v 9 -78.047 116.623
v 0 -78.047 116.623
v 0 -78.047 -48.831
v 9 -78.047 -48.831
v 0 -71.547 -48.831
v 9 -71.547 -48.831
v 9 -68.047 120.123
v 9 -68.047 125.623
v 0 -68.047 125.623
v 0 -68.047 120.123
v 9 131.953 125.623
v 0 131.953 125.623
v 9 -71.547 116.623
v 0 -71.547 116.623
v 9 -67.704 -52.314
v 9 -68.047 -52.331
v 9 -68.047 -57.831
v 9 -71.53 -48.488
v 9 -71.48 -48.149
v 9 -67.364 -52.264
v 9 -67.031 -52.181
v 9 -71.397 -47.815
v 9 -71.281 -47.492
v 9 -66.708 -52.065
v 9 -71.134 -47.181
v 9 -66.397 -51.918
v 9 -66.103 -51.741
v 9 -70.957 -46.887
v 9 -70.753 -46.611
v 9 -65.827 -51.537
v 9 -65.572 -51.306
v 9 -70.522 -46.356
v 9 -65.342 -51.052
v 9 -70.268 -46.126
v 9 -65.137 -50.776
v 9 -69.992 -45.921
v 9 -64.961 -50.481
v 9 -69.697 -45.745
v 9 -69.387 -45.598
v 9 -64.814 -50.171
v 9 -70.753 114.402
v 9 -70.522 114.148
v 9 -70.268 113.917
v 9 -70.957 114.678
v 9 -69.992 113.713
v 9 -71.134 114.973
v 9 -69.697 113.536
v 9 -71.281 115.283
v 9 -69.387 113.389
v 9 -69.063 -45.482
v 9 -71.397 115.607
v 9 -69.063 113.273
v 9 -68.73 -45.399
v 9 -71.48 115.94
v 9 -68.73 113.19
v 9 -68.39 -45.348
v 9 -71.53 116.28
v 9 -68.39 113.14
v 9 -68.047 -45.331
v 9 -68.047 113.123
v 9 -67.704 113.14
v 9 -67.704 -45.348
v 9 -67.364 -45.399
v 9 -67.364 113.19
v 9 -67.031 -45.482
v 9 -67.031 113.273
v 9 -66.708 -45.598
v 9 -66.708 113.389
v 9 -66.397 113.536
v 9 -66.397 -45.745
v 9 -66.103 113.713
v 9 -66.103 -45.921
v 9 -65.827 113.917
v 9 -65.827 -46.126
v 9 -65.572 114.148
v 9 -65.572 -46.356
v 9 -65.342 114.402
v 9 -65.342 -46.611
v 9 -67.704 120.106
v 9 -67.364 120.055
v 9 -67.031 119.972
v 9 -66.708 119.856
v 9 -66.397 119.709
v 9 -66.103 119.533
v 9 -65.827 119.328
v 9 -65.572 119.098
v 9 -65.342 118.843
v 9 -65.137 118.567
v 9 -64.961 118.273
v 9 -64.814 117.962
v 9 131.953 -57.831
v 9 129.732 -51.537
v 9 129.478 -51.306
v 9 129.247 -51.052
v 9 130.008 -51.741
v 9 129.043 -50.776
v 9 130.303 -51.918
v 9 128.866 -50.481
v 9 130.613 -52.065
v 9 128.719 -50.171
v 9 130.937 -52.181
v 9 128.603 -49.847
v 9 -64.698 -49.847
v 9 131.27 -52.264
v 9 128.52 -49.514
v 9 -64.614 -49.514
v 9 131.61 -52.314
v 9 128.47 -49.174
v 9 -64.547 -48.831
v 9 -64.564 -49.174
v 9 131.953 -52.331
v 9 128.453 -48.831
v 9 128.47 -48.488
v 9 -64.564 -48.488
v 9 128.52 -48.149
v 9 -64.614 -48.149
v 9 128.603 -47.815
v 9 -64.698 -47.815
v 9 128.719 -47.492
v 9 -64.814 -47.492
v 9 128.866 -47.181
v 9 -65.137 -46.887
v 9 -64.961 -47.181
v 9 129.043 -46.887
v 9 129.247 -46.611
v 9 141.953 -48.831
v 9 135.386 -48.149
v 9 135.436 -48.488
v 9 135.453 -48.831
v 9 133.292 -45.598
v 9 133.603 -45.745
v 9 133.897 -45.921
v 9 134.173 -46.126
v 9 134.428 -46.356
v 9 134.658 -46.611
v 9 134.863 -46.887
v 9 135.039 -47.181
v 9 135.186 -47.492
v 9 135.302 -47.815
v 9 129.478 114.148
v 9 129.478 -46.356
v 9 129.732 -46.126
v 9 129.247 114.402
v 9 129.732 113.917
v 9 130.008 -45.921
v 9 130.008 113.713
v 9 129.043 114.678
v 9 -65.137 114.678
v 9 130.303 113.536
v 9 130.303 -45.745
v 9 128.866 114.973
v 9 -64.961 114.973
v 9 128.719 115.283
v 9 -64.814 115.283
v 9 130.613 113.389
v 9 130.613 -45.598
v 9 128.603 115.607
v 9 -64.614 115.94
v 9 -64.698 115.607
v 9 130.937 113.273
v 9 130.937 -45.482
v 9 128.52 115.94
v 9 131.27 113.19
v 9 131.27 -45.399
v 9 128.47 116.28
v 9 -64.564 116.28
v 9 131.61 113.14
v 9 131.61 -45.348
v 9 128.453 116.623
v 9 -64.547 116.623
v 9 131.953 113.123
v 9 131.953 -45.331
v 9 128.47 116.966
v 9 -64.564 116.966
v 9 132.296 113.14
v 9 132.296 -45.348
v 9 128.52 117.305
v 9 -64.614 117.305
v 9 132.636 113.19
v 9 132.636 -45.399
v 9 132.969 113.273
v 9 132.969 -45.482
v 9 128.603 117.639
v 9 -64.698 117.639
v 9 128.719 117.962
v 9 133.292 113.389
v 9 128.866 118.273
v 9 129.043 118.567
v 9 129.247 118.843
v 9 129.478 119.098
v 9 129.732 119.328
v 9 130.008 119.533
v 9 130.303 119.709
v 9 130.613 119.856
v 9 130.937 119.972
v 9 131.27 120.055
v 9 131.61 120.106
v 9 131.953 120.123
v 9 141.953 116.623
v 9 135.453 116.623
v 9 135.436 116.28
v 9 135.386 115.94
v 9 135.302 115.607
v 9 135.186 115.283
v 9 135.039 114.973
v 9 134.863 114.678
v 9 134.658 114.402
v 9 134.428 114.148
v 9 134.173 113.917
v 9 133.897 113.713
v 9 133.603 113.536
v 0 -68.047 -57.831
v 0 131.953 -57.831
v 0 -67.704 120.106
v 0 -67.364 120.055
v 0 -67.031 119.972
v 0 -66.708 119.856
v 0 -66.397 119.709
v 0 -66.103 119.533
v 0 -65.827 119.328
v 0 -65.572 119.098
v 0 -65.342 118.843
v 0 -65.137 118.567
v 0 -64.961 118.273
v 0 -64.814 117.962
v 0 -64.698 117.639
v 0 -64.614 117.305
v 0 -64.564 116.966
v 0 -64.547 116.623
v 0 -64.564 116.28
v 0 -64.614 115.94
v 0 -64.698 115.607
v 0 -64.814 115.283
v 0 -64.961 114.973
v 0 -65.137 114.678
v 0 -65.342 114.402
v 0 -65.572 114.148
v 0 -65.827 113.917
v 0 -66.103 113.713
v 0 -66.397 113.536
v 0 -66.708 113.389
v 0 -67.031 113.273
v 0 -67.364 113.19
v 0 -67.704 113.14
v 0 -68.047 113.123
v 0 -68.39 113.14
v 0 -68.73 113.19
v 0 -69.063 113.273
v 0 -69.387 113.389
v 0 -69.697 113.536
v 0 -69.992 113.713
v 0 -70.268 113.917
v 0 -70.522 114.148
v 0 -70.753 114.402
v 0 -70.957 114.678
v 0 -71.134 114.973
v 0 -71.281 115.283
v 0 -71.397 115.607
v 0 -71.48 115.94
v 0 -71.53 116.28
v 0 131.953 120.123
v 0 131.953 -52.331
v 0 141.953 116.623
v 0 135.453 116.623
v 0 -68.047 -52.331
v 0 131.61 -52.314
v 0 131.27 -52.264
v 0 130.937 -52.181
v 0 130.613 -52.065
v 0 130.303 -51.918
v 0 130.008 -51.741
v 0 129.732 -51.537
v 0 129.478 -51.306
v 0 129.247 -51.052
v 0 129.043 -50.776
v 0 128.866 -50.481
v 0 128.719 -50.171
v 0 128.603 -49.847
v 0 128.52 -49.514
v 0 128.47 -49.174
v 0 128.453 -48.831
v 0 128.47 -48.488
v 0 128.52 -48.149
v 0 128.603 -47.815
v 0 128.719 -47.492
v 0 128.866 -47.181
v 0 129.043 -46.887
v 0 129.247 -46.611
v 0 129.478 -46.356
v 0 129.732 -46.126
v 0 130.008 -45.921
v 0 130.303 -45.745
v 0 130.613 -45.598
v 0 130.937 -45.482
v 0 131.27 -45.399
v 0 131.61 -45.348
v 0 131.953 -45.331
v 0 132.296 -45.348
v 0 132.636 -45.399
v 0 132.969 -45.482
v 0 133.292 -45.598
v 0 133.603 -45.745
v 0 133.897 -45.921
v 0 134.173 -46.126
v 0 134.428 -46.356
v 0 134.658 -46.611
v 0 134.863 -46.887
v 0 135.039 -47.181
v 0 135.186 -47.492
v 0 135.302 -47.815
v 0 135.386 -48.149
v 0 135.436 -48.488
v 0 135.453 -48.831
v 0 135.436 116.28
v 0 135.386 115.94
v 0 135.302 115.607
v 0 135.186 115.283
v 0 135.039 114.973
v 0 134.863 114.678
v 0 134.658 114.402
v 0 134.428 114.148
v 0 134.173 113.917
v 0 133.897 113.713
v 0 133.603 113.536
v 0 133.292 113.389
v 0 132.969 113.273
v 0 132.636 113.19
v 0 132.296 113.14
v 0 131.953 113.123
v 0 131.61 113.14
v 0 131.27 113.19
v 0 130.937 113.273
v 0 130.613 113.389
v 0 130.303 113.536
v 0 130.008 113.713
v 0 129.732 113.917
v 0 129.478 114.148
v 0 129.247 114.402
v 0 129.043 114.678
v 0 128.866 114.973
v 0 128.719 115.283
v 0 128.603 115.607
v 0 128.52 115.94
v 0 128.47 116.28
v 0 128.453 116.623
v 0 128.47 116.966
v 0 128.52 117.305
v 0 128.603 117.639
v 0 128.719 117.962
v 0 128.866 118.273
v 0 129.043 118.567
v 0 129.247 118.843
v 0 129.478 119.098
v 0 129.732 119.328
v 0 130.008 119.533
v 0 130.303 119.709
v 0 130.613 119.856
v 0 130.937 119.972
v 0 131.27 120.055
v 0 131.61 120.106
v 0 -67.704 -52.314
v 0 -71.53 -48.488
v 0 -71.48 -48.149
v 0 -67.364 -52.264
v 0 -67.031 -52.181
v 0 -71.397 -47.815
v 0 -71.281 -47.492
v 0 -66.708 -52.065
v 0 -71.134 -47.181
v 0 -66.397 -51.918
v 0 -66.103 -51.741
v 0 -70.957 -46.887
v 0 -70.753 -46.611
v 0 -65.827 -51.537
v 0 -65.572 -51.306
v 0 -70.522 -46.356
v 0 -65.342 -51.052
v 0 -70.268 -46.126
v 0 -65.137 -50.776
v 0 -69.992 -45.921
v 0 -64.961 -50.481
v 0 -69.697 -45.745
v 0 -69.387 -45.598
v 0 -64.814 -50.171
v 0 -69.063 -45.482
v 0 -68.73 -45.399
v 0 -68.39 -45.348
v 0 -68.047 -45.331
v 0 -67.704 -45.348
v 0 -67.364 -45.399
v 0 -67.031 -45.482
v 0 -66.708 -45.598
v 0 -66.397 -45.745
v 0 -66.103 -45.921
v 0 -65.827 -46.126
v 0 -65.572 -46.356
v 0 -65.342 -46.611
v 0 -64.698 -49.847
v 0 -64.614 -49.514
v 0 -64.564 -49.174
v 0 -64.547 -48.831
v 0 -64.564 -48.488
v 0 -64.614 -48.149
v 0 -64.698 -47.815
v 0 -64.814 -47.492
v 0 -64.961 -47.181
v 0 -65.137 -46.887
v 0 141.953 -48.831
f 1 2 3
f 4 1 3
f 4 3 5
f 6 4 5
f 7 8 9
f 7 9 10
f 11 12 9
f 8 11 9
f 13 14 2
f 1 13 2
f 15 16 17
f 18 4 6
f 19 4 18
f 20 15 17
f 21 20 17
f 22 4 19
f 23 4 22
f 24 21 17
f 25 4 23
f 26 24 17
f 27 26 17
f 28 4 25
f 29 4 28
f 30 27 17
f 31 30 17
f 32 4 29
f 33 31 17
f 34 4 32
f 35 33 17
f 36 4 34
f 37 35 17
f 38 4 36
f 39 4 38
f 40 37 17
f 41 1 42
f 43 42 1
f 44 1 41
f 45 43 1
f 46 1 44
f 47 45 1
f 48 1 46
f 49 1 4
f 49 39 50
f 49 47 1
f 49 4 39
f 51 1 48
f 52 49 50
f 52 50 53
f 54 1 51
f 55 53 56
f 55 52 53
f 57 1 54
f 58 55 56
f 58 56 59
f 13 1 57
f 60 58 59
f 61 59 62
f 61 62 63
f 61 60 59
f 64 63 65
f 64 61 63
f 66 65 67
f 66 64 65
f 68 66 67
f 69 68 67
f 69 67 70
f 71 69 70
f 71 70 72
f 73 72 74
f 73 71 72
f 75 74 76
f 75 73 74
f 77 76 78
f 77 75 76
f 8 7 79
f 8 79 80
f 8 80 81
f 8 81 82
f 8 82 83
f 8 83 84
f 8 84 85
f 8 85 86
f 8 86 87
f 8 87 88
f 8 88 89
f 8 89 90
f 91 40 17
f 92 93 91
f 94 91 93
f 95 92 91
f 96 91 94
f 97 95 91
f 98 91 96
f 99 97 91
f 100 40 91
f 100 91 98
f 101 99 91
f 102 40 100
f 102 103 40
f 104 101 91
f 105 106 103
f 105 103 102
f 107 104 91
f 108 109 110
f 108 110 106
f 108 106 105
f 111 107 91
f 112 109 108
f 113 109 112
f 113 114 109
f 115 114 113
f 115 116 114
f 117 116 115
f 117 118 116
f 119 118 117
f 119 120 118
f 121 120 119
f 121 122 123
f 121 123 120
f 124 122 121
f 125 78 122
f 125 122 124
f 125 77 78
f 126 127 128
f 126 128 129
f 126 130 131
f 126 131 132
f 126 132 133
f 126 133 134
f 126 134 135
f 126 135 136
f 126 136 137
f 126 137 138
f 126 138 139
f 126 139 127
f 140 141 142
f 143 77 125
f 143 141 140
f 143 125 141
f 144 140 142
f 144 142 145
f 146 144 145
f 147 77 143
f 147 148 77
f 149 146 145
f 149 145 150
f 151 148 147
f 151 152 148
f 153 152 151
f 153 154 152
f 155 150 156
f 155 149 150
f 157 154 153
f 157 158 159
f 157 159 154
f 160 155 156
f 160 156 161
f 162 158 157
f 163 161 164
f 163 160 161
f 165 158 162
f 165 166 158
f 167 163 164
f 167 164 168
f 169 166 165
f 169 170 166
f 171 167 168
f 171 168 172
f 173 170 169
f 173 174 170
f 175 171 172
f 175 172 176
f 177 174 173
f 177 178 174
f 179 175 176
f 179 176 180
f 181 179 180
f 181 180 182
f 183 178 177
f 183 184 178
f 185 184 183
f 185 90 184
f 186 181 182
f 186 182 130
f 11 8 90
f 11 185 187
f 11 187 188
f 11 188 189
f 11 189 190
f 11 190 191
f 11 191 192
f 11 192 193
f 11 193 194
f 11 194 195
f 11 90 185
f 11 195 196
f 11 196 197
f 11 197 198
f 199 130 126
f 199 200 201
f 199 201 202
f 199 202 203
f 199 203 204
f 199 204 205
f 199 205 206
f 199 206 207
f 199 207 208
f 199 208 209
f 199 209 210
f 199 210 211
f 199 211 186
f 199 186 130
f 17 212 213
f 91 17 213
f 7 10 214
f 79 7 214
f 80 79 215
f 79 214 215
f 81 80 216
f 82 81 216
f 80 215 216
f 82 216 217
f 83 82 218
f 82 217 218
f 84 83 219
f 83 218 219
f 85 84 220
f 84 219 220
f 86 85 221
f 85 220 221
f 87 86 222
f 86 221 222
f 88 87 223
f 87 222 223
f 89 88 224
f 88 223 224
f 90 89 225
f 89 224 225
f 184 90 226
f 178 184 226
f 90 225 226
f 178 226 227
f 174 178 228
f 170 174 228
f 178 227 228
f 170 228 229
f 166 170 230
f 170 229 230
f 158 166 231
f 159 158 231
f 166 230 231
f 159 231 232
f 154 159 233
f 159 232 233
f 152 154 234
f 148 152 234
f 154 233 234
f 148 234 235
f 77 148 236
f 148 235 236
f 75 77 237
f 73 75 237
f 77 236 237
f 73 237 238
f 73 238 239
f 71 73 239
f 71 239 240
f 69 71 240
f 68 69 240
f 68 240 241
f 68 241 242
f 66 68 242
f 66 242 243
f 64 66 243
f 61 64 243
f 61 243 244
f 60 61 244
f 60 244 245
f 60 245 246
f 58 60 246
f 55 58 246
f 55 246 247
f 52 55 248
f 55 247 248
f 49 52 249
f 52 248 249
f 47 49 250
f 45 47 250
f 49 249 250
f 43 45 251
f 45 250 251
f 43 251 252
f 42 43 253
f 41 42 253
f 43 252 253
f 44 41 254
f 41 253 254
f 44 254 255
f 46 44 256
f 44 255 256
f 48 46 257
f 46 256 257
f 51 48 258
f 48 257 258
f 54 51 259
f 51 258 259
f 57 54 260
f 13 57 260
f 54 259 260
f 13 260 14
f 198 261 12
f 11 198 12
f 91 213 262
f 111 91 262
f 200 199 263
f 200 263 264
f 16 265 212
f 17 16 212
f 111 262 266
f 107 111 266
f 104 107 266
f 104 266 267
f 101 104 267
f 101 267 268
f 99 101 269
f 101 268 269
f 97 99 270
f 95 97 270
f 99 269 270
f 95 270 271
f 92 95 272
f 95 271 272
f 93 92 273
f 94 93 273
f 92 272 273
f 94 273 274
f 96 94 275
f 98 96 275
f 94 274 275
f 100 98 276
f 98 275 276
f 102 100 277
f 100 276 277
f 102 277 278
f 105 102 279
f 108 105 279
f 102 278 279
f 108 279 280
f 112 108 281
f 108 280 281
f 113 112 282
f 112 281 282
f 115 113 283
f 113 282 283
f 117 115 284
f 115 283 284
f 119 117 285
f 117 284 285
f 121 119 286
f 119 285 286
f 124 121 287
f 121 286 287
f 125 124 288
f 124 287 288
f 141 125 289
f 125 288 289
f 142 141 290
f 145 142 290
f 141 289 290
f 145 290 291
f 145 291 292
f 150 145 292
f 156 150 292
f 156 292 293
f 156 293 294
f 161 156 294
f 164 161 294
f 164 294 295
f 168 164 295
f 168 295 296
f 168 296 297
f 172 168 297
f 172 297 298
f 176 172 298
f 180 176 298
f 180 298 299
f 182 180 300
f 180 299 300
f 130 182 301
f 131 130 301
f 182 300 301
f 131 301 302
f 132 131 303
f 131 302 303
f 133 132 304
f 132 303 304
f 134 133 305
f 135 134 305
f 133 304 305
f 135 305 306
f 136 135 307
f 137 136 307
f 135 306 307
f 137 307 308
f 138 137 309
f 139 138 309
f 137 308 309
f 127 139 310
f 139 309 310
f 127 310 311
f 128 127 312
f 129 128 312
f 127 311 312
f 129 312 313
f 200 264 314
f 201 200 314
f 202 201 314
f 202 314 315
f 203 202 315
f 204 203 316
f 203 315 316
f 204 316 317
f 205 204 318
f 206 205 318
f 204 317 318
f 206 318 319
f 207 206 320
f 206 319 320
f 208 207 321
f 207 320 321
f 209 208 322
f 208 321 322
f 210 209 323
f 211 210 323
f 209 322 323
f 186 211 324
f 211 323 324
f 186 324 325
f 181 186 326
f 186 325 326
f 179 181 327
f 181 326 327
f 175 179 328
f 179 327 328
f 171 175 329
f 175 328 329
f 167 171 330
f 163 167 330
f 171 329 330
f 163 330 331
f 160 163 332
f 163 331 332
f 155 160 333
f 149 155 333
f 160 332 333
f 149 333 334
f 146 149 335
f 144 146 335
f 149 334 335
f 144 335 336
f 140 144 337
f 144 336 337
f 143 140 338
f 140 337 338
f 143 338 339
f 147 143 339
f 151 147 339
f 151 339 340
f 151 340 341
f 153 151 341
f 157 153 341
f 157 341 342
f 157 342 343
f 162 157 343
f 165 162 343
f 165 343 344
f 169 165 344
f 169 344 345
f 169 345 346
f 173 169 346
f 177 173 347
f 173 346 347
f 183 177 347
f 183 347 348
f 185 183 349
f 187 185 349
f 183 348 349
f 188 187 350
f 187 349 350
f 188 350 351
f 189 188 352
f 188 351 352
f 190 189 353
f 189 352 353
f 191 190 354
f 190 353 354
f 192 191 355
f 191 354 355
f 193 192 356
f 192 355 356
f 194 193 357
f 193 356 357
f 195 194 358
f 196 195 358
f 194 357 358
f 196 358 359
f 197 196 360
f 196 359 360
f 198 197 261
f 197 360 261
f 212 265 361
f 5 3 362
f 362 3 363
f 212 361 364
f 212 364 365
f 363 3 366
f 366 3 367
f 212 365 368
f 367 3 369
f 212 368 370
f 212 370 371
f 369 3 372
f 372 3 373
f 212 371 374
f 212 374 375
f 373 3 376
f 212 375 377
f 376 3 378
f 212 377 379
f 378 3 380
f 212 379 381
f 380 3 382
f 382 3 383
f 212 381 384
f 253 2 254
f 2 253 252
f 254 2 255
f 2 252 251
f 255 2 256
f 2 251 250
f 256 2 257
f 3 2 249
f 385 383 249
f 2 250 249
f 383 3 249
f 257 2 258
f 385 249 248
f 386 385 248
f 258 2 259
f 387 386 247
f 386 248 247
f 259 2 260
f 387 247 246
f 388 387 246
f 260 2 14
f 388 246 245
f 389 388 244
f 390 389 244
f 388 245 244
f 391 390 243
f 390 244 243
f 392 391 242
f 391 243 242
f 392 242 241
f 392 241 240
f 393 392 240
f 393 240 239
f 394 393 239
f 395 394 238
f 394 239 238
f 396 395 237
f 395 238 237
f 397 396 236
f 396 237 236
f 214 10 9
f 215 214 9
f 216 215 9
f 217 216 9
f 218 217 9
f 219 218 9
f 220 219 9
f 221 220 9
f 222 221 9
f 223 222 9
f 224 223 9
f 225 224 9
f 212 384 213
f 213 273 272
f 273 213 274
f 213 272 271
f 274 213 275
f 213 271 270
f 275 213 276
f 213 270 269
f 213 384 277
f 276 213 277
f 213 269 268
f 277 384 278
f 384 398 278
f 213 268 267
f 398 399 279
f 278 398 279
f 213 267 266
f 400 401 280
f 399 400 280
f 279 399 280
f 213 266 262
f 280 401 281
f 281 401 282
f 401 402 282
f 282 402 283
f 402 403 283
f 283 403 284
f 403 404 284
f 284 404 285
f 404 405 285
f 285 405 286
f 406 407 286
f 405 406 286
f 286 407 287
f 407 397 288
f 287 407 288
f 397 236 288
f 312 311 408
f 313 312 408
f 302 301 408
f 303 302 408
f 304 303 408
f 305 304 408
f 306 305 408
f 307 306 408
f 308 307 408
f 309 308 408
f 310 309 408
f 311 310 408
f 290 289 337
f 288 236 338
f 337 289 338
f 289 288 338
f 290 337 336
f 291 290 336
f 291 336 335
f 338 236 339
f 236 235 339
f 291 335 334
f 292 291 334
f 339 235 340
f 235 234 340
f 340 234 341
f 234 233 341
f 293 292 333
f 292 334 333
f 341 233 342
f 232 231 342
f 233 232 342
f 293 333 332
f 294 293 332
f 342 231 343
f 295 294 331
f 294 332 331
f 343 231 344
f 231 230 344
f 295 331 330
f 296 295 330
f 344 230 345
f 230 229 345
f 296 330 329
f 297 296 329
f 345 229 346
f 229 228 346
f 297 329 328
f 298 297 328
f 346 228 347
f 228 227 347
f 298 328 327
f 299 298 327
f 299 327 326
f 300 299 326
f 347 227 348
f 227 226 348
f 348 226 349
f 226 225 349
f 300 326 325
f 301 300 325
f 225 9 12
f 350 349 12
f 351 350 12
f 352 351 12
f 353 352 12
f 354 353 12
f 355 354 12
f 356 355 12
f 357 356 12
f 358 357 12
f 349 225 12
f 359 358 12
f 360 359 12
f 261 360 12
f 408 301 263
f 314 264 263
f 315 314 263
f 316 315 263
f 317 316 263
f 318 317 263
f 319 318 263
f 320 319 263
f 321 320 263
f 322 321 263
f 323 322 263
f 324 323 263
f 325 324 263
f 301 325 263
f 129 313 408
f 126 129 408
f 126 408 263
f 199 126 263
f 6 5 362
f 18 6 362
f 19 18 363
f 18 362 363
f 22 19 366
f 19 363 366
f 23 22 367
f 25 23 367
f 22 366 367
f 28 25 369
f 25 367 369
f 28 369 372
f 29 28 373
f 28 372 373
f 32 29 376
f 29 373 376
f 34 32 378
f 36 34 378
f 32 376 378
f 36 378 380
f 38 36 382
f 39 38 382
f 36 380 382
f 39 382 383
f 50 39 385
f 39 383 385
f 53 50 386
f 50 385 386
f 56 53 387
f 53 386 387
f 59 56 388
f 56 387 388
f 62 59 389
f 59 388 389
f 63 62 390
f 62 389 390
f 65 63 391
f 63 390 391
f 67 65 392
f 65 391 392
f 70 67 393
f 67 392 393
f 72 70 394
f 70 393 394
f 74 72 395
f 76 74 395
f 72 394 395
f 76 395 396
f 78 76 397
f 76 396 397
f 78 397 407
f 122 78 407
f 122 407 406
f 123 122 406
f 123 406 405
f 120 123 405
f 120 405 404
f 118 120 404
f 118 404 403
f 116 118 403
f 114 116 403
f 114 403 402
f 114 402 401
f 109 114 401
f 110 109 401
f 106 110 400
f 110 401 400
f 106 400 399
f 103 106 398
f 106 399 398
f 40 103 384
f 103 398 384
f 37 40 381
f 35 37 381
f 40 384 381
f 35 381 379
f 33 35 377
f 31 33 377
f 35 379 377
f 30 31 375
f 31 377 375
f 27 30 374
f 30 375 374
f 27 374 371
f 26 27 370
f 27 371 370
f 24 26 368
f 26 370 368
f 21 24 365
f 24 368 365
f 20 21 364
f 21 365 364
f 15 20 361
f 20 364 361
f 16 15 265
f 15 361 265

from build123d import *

# Parameters (mm, degrees)
F1_DEPTH = 9


# Not quite as in the source:
# - ends of sketch curves that miss each other by under 0.0002 mm in the source are joined


with BuildPart() as f1:
    # F0 (on Right) → F1 (new body)
    with BuildSketch(Plane.YZ):
        with BuildLine():
            Line((-71.5472308397, 116.6226820285), (-78.0472308397, 116.6226820285))
            Line((-78.0472308397, 116.6226820285), (-78.0472319707, -48.8313179715))
            Line((-78.0472319707, -48.8313179715), (-71.5472308397, -48.8313179715))
            ThreePointArc((-71.5472308397, -48.8313179715), (-65.5723571056, -46.3564442373), (-68.0472308397, -52.3313179715))
            Line((-68.0472308397, -52.3313179715), (-68.0472308397, -57.8313179715))
            Line((-68.0472308397, -57.8313179715), (31.9527691603, -57.8313179715))
            Line((31.9527691603, -57.8313179715), (131.9527668982, -57.8313179715))
            Line((131.9527668982, -57.8313179715), (131.9527668982, -52.3313179715))
            ThreePointArc((131.9527668982, -52.3313179715), (129.4778931641, -46.3564442373), (135.4527668982, -48.8313179715))
            Line((135.4527668982, -48.8313179715), (141.9527668982, -48.8313179715))
            Line((141.9527668982, -48.8313179715), (141.9527680293, 116.6226820285))
            Line((141.9527680293, 116.6226820285), (135.4527668982, 116.6226820285))
            ThreePointArc((135.4527668982, 116.6226820285), (129.4778931641, 114.1478082944), (131.9527668982, 120.1226820285))
            Line((131.9527668982, 120.1226820285), (131.9527668982, 125.6226820285))
            Line((131.9527668982, 125.6226820285), (31.9527668982, 125.6226820285))
            Line((31.9527668982, 125.6226820285), (-68.0472308397, 125.6226820285))
            Line((-68.0472308397, 125.6226820285), (-68.0472308397, 120.1226820285))
            ThreePointArc((-68.0472308397, 120.1226820285), (-65.5723571056, 114.1478082944), (-71.5472308397, 116.6226820285))
        make_face()
    extrude(amount=F1_DEPTH)


solid = f1.part
